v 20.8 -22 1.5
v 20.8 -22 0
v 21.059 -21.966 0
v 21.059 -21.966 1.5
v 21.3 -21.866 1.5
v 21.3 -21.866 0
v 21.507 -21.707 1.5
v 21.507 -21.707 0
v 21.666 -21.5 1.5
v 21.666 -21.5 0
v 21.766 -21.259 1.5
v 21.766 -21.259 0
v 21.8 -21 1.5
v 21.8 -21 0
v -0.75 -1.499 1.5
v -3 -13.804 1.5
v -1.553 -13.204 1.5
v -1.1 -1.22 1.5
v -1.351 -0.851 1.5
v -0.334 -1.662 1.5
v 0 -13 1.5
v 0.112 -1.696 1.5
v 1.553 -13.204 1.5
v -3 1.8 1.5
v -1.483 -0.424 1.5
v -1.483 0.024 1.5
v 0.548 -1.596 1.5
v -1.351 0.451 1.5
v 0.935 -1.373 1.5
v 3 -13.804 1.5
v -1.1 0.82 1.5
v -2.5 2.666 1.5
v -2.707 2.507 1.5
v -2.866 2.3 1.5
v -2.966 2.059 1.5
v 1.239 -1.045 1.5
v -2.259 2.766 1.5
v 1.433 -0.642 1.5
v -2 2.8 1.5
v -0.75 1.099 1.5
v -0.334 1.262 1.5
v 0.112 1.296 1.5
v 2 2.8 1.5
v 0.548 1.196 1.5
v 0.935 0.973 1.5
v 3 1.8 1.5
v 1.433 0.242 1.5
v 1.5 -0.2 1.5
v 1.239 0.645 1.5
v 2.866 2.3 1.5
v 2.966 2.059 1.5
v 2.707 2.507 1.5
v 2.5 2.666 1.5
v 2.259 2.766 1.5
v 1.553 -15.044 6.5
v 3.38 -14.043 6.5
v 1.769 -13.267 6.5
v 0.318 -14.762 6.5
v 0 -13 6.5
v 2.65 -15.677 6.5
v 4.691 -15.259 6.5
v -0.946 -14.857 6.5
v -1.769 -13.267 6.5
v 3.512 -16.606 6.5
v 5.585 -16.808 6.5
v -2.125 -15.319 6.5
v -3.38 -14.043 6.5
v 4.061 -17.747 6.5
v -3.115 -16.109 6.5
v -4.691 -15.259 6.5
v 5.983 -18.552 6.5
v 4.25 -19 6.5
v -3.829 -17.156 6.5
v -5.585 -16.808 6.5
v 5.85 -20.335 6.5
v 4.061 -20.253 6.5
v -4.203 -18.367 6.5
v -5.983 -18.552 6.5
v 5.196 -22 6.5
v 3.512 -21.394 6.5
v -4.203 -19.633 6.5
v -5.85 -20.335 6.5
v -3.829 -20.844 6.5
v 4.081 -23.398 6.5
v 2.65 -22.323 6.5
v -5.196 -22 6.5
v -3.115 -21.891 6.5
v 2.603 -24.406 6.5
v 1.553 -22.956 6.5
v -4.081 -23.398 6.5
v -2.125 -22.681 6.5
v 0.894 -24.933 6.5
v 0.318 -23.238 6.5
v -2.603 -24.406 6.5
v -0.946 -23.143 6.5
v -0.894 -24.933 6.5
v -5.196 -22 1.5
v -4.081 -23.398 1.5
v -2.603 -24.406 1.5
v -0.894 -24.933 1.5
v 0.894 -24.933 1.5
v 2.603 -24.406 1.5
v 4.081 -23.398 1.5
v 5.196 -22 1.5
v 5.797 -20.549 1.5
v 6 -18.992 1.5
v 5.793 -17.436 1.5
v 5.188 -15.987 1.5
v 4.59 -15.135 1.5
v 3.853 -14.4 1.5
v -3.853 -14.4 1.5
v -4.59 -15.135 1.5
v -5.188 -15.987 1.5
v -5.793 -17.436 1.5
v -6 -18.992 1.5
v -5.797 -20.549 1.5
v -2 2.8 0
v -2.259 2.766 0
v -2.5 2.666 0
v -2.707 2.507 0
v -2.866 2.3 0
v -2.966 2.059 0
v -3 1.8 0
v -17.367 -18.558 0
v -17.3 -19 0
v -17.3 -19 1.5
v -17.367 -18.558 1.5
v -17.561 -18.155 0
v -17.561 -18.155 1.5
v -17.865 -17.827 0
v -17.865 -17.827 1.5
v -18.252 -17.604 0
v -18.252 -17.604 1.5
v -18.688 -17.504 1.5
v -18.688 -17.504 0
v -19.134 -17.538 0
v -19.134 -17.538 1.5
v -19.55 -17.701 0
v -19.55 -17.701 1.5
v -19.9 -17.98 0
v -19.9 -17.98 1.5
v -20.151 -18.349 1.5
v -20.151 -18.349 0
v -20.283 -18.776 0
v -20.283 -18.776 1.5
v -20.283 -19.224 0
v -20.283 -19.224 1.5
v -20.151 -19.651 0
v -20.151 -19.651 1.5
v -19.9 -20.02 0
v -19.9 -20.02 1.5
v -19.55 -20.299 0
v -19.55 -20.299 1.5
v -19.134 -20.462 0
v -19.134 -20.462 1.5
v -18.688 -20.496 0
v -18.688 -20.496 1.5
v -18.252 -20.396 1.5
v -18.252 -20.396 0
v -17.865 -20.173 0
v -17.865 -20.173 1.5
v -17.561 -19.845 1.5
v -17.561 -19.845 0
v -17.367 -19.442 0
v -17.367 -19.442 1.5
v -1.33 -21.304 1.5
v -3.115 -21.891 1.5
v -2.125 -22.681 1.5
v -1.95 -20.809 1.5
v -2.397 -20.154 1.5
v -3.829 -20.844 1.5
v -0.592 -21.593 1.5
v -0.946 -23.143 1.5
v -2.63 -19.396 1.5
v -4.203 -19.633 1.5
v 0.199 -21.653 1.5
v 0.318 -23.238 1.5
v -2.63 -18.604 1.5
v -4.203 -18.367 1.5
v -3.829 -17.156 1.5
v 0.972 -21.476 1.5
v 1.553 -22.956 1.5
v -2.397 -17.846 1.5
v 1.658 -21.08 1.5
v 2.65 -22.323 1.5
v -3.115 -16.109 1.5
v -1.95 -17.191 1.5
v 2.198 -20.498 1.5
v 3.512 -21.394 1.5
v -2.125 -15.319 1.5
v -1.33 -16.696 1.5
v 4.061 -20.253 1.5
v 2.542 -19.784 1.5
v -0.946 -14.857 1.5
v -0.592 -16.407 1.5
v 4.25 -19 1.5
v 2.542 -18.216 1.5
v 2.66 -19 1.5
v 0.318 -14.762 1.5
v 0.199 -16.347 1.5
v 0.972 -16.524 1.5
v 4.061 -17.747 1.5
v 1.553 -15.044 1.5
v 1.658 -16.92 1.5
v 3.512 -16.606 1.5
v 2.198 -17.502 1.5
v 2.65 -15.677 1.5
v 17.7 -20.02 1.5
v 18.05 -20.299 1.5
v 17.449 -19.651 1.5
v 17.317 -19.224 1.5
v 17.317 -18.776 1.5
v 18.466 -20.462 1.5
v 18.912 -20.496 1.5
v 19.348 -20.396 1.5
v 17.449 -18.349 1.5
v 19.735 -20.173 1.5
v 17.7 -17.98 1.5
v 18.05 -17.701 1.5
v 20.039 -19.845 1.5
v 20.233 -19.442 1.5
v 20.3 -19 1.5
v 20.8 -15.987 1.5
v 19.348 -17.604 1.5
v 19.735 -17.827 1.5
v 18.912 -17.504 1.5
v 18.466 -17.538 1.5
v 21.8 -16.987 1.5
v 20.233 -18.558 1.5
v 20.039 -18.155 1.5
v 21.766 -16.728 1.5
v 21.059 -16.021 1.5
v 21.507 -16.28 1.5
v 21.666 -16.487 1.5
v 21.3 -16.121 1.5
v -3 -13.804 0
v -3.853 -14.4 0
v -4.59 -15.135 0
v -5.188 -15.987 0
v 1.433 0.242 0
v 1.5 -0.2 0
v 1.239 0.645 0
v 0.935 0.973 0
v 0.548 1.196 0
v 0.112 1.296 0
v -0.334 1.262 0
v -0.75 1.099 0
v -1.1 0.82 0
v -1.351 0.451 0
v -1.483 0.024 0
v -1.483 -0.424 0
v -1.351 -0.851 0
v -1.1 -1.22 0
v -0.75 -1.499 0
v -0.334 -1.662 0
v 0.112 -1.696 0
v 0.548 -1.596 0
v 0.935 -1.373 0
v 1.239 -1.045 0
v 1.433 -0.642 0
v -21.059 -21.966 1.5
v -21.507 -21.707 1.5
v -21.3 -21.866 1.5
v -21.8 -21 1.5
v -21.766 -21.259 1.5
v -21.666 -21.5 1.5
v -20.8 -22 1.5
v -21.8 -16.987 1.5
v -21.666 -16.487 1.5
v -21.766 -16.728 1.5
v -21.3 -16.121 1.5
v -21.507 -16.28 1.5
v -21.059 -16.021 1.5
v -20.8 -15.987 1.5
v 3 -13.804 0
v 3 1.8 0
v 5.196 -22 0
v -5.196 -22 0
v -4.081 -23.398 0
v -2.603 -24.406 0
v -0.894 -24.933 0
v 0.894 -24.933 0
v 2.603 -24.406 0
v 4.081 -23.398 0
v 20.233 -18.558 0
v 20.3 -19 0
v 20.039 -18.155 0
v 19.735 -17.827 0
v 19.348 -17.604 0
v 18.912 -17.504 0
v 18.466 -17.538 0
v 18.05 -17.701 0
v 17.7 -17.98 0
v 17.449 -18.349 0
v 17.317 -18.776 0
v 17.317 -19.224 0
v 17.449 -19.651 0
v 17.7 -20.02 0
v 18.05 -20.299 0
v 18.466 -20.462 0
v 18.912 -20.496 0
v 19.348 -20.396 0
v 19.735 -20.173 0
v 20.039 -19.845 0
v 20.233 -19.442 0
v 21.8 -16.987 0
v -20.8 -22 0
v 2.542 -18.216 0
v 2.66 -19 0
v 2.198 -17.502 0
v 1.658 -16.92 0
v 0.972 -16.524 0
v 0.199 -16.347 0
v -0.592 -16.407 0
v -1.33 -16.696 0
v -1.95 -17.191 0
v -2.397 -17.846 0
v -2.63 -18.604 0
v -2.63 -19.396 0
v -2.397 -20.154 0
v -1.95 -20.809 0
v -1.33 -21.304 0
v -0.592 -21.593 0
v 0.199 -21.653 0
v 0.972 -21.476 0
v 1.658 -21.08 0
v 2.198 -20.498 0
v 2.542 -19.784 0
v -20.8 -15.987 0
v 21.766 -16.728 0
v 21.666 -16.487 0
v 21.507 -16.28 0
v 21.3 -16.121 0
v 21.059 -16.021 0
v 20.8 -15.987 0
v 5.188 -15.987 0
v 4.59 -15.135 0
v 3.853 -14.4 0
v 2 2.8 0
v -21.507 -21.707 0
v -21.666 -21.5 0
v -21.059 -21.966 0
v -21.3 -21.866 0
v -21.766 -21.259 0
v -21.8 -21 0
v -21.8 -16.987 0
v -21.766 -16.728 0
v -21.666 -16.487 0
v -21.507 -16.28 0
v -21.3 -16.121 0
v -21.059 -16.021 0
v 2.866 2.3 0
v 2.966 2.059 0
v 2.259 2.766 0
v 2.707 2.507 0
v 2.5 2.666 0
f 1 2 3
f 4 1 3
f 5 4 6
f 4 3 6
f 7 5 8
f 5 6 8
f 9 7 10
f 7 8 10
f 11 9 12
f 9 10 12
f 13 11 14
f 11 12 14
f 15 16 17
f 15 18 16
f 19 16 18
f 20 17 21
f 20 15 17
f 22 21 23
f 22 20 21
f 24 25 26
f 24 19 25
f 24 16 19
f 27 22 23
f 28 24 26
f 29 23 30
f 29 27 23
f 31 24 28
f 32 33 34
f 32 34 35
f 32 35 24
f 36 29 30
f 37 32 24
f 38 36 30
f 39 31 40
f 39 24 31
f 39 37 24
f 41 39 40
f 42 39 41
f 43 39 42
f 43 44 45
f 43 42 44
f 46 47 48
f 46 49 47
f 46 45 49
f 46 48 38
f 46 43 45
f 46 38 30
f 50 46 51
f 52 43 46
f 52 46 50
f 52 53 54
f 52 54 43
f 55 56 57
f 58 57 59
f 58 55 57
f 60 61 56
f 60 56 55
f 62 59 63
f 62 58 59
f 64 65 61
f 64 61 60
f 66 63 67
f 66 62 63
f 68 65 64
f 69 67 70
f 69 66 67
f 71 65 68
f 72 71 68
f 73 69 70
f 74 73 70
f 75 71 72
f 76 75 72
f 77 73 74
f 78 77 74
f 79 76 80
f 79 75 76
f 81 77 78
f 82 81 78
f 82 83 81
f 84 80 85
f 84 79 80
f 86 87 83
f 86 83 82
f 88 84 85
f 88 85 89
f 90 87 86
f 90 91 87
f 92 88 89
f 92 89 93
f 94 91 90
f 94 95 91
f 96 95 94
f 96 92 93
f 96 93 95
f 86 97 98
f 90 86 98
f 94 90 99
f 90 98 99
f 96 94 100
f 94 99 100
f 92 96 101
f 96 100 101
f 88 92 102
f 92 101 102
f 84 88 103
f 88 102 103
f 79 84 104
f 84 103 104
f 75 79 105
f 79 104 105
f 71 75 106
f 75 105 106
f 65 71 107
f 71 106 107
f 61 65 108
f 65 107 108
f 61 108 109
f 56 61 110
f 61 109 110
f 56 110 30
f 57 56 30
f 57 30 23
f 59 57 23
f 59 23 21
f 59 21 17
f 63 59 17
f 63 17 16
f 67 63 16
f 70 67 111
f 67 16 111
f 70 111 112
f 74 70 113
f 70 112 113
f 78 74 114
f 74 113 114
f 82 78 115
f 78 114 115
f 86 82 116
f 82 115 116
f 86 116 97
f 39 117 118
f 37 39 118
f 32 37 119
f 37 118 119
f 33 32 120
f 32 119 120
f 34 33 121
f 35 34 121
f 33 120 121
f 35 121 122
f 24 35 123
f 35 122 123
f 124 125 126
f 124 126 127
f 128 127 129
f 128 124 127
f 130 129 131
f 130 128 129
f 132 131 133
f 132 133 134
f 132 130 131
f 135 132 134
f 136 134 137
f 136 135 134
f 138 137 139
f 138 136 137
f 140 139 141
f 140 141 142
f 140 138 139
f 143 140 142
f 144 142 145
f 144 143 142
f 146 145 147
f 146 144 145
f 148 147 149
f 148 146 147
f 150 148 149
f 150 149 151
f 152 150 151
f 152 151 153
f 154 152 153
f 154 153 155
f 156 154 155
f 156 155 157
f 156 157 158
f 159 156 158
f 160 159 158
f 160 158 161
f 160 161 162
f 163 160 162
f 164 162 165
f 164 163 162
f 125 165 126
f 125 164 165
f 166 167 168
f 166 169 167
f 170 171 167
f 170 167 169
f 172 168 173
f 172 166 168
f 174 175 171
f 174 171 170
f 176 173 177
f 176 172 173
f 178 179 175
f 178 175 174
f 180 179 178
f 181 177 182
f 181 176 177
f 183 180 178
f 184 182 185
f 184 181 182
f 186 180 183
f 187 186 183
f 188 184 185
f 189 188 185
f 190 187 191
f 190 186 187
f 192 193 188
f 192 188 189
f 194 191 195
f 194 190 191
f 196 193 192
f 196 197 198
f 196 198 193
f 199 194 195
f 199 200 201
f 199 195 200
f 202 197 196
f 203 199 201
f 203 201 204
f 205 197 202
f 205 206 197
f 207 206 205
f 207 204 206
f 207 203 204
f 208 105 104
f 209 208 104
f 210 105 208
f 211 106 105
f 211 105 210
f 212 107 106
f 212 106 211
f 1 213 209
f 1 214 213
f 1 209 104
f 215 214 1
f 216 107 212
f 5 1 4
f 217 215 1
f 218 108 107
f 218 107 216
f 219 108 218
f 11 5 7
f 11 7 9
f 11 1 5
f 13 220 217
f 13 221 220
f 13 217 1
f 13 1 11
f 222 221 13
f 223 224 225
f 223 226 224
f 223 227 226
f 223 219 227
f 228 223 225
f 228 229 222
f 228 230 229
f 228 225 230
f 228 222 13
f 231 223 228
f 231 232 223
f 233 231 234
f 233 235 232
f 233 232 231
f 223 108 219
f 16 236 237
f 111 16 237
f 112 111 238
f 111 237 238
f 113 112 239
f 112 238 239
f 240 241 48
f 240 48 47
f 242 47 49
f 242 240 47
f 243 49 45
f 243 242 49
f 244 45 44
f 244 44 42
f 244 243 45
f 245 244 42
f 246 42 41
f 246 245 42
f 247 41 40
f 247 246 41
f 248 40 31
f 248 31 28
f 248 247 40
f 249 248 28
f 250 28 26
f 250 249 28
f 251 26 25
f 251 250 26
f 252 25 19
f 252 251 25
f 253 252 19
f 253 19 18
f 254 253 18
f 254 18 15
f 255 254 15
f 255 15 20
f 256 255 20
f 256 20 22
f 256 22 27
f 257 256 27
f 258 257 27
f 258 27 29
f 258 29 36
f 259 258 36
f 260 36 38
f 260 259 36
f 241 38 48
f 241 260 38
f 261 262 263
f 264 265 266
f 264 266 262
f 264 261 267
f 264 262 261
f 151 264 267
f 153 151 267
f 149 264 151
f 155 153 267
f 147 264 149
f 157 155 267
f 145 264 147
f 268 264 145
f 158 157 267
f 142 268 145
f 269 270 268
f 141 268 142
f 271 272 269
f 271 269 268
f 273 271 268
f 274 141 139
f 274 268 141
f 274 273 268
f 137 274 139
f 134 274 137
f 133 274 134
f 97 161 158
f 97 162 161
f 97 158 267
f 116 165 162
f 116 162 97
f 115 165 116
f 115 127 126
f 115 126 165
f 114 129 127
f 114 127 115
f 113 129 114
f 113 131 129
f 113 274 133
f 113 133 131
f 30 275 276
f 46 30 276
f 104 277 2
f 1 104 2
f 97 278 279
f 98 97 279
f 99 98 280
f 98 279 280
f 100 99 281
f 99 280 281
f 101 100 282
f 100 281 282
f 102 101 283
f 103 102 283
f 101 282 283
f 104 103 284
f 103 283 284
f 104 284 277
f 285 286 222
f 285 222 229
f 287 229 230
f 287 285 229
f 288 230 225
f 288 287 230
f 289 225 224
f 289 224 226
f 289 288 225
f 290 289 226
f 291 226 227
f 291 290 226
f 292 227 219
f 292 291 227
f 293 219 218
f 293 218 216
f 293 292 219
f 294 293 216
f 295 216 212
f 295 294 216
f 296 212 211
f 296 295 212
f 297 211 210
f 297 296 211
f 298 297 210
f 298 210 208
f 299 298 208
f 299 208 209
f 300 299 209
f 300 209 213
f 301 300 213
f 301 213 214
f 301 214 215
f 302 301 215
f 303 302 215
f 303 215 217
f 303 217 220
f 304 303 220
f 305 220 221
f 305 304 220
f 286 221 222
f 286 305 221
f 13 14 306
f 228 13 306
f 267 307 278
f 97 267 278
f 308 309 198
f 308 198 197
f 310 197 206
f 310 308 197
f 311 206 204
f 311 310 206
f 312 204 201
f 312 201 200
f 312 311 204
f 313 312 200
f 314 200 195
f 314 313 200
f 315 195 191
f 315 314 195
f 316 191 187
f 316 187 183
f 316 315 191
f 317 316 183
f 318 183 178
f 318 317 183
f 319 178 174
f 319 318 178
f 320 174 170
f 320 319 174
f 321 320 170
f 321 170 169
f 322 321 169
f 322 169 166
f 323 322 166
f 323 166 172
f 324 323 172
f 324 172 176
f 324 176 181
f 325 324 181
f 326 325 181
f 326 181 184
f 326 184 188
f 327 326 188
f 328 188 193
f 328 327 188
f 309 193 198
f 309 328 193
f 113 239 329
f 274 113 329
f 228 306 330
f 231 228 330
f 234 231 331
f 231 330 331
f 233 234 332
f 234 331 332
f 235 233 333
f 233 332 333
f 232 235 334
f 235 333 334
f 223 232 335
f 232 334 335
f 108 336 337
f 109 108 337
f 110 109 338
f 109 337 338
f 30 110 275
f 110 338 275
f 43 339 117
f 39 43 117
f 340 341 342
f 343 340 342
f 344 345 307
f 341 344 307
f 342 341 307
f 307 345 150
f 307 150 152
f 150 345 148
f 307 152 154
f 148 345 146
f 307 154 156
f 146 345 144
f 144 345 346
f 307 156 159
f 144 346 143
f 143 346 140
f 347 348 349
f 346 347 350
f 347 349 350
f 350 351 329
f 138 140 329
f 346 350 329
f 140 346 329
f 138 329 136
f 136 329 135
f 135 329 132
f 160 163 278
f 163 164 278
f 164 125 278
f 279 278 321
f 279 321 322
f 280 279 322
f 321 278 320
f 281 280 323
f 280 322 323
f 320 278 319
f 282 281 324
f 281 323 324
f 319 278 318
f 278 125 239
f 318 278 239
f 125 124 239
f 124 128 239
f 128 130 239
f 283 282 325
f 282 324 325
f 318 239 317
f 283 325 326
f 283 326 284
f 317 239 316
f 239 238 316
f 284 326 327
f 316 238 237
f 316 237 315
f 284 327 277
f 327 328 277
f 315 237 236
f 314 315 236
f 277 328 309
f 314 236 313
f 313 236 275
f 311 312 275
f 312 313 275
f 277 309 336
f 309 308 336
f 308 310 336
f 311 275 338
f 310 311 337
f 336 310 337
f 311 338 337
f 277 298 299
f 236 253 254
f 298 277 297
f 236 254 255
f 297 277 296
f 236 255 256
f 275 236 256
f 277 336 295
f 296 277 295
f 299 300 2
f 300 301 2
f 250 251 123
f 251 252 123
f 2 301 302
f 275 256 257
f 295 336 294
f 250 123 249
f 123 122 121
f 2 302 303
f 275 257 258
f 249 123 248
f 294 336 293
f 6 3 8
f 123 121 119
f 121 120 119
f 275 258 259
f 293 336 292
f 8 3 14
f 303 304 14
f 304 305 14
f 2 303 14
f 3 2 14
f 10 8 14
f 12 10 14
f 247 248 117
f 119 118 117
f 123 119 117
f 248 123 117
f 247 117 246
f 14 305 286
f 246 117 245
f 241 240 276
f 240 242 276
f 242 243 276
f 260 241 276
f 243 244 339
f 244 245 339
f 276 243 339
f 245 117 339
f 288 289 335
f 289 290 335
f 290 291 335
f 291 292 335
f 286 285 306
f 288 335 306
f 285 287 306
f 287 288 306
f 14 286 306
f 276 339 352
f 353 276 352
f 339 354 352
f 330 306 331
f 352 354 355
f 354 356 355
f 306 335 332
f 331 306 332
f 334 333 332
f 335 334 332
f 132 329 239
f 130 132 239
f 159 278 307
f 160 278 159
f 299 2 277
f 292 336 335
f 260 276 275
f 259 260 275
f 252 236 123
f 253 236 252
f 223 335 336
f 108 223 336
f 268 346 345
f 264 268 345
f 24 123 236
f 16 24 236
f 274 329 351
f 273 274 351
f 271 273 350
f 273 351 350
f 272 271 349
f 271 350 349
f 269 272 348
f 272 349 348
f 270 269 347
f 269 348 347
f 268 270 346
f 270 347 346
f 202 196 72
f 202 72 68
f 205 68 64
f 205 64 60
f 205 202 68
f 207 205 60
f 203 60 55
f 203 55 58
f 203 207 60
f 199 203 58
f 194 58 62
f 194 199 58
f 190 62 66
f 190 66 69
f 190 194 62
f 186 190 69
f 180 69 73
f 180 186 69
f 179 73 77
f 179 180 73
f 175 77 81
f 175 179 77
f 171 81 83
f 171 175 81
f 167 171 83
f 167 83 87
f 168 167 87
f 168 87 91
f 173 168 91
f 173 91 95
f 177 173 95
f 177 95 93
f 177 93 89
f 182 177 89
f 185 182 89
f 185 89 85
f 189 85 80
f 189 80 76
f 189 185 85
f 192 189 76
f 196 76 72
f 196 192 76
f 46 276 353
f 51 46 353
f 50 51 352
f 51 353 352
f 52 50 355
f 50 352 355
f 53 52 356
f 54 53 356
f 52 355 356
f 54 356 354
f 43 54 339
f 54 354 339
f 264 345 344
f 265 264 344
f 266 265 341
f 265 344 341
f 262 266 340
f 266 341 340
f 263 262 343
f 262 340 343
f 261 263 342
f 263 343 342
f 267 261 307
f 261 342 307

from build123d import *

# Parameters (mm, degrees)
SKETCH_2_R      = 2.66
SKETCH_2_R_2    = 1.5
EXTRUDE_1_DEPTH = 1.5
SKETCH_3_R      = 6
SKETCH_3_R_2    = 4.25
EXTRUDE_2_DEPTH = 5


with BuildPart() as part:
    # 草图2 → 凸台-拉伸1 (new body)
    with BuildSketch(Plane.XY):
        with BuildLine():
            Line((-5.188427748, -15.986660076), (-20.8, -15.986660076))
            ThreePointArc((-20.8, -15.986660076), (-21.507106781, -16.279553295), (-21.8, -16.986660076))
            Line((-21.8, -16.986660076), (-21.8, -21))
            ThreePointArc((-21.8, -21), (-21.507106781, -21.707106781), (-20.8, -22))
            Line((-20.8, -22), (-5.196152423, -22))
            ThreePointArc((-5.196152423, -22), (0, -25), (5.196152423, -22))
            Line((5.196152423, -22), (20.8, -22))
            ThreePointArc((20.8, -22), (21.507106781, -21.707106781), (21.8, -21))
            Line((21.8, -21), (21.8, -16.986660076))
            ThreePointArc((21.8, -16.986660076), (21.507106781, -16.279553295), (20.8, -15.986660076))
            Line((20.8, -15.986660076), (5.188427748, -15.986660076))
            ThreePointArc((5.188427748, -15.986660076), (4.237187139, -14.751912766), (3, -13.803847577))
            Line((3, -13.803847577), (3, 1.8))
            ThreePointArc((3, 1.8), (2.707106781, 2.507106781), (2, 2.8))
            Line((2, 2.8), (-2, 2.8))
            ThreePointArc((-2, 2.8), (-2.707106781, 2.507106781), (-3, 1.8))
            Line((-3, 1.8), (-3, -13.803847577))
            ThreePointArc((-3, -13.803847577), (-4.237187139, -14.751912766), (-5.188427748, -15.986660076))
        make_face()
        with Locations((0, -19)):
            Circle(SKETCH_2_R, mode=Mode.SUBTRACT)
        with Locations((-18.8, -19)):
            Circle(SKETCH_2_R_2, mode=Mode.SUBTRACT)
        with Locations((18.8, -19)):
            Circle(SKETCH_2_R_2, mode=Mode.SUBTRACT)
        with Locations((0, -0.2)):
            Circle(SKETCH_2_R_2, mode=Mode.SUBTRACT)
    extrude(amount=EXTRUDE_1_DEPTH)

    # 草图3 → 凸台-拉伸2 (add)
    with BuildSketch(Plane.XY.offset(1.5)):
        with Locations(Location((0, -19, 0), (0, 0, 210))):
            Circle(SKETCH_3_R)
        with Locations((0, -19)):
            Circle(SKETCH_3_R_2, mode=Mode.SUBTRACT)
    extrude(amount=EXTRUDE_2_DEPTH)


solid = part.part
